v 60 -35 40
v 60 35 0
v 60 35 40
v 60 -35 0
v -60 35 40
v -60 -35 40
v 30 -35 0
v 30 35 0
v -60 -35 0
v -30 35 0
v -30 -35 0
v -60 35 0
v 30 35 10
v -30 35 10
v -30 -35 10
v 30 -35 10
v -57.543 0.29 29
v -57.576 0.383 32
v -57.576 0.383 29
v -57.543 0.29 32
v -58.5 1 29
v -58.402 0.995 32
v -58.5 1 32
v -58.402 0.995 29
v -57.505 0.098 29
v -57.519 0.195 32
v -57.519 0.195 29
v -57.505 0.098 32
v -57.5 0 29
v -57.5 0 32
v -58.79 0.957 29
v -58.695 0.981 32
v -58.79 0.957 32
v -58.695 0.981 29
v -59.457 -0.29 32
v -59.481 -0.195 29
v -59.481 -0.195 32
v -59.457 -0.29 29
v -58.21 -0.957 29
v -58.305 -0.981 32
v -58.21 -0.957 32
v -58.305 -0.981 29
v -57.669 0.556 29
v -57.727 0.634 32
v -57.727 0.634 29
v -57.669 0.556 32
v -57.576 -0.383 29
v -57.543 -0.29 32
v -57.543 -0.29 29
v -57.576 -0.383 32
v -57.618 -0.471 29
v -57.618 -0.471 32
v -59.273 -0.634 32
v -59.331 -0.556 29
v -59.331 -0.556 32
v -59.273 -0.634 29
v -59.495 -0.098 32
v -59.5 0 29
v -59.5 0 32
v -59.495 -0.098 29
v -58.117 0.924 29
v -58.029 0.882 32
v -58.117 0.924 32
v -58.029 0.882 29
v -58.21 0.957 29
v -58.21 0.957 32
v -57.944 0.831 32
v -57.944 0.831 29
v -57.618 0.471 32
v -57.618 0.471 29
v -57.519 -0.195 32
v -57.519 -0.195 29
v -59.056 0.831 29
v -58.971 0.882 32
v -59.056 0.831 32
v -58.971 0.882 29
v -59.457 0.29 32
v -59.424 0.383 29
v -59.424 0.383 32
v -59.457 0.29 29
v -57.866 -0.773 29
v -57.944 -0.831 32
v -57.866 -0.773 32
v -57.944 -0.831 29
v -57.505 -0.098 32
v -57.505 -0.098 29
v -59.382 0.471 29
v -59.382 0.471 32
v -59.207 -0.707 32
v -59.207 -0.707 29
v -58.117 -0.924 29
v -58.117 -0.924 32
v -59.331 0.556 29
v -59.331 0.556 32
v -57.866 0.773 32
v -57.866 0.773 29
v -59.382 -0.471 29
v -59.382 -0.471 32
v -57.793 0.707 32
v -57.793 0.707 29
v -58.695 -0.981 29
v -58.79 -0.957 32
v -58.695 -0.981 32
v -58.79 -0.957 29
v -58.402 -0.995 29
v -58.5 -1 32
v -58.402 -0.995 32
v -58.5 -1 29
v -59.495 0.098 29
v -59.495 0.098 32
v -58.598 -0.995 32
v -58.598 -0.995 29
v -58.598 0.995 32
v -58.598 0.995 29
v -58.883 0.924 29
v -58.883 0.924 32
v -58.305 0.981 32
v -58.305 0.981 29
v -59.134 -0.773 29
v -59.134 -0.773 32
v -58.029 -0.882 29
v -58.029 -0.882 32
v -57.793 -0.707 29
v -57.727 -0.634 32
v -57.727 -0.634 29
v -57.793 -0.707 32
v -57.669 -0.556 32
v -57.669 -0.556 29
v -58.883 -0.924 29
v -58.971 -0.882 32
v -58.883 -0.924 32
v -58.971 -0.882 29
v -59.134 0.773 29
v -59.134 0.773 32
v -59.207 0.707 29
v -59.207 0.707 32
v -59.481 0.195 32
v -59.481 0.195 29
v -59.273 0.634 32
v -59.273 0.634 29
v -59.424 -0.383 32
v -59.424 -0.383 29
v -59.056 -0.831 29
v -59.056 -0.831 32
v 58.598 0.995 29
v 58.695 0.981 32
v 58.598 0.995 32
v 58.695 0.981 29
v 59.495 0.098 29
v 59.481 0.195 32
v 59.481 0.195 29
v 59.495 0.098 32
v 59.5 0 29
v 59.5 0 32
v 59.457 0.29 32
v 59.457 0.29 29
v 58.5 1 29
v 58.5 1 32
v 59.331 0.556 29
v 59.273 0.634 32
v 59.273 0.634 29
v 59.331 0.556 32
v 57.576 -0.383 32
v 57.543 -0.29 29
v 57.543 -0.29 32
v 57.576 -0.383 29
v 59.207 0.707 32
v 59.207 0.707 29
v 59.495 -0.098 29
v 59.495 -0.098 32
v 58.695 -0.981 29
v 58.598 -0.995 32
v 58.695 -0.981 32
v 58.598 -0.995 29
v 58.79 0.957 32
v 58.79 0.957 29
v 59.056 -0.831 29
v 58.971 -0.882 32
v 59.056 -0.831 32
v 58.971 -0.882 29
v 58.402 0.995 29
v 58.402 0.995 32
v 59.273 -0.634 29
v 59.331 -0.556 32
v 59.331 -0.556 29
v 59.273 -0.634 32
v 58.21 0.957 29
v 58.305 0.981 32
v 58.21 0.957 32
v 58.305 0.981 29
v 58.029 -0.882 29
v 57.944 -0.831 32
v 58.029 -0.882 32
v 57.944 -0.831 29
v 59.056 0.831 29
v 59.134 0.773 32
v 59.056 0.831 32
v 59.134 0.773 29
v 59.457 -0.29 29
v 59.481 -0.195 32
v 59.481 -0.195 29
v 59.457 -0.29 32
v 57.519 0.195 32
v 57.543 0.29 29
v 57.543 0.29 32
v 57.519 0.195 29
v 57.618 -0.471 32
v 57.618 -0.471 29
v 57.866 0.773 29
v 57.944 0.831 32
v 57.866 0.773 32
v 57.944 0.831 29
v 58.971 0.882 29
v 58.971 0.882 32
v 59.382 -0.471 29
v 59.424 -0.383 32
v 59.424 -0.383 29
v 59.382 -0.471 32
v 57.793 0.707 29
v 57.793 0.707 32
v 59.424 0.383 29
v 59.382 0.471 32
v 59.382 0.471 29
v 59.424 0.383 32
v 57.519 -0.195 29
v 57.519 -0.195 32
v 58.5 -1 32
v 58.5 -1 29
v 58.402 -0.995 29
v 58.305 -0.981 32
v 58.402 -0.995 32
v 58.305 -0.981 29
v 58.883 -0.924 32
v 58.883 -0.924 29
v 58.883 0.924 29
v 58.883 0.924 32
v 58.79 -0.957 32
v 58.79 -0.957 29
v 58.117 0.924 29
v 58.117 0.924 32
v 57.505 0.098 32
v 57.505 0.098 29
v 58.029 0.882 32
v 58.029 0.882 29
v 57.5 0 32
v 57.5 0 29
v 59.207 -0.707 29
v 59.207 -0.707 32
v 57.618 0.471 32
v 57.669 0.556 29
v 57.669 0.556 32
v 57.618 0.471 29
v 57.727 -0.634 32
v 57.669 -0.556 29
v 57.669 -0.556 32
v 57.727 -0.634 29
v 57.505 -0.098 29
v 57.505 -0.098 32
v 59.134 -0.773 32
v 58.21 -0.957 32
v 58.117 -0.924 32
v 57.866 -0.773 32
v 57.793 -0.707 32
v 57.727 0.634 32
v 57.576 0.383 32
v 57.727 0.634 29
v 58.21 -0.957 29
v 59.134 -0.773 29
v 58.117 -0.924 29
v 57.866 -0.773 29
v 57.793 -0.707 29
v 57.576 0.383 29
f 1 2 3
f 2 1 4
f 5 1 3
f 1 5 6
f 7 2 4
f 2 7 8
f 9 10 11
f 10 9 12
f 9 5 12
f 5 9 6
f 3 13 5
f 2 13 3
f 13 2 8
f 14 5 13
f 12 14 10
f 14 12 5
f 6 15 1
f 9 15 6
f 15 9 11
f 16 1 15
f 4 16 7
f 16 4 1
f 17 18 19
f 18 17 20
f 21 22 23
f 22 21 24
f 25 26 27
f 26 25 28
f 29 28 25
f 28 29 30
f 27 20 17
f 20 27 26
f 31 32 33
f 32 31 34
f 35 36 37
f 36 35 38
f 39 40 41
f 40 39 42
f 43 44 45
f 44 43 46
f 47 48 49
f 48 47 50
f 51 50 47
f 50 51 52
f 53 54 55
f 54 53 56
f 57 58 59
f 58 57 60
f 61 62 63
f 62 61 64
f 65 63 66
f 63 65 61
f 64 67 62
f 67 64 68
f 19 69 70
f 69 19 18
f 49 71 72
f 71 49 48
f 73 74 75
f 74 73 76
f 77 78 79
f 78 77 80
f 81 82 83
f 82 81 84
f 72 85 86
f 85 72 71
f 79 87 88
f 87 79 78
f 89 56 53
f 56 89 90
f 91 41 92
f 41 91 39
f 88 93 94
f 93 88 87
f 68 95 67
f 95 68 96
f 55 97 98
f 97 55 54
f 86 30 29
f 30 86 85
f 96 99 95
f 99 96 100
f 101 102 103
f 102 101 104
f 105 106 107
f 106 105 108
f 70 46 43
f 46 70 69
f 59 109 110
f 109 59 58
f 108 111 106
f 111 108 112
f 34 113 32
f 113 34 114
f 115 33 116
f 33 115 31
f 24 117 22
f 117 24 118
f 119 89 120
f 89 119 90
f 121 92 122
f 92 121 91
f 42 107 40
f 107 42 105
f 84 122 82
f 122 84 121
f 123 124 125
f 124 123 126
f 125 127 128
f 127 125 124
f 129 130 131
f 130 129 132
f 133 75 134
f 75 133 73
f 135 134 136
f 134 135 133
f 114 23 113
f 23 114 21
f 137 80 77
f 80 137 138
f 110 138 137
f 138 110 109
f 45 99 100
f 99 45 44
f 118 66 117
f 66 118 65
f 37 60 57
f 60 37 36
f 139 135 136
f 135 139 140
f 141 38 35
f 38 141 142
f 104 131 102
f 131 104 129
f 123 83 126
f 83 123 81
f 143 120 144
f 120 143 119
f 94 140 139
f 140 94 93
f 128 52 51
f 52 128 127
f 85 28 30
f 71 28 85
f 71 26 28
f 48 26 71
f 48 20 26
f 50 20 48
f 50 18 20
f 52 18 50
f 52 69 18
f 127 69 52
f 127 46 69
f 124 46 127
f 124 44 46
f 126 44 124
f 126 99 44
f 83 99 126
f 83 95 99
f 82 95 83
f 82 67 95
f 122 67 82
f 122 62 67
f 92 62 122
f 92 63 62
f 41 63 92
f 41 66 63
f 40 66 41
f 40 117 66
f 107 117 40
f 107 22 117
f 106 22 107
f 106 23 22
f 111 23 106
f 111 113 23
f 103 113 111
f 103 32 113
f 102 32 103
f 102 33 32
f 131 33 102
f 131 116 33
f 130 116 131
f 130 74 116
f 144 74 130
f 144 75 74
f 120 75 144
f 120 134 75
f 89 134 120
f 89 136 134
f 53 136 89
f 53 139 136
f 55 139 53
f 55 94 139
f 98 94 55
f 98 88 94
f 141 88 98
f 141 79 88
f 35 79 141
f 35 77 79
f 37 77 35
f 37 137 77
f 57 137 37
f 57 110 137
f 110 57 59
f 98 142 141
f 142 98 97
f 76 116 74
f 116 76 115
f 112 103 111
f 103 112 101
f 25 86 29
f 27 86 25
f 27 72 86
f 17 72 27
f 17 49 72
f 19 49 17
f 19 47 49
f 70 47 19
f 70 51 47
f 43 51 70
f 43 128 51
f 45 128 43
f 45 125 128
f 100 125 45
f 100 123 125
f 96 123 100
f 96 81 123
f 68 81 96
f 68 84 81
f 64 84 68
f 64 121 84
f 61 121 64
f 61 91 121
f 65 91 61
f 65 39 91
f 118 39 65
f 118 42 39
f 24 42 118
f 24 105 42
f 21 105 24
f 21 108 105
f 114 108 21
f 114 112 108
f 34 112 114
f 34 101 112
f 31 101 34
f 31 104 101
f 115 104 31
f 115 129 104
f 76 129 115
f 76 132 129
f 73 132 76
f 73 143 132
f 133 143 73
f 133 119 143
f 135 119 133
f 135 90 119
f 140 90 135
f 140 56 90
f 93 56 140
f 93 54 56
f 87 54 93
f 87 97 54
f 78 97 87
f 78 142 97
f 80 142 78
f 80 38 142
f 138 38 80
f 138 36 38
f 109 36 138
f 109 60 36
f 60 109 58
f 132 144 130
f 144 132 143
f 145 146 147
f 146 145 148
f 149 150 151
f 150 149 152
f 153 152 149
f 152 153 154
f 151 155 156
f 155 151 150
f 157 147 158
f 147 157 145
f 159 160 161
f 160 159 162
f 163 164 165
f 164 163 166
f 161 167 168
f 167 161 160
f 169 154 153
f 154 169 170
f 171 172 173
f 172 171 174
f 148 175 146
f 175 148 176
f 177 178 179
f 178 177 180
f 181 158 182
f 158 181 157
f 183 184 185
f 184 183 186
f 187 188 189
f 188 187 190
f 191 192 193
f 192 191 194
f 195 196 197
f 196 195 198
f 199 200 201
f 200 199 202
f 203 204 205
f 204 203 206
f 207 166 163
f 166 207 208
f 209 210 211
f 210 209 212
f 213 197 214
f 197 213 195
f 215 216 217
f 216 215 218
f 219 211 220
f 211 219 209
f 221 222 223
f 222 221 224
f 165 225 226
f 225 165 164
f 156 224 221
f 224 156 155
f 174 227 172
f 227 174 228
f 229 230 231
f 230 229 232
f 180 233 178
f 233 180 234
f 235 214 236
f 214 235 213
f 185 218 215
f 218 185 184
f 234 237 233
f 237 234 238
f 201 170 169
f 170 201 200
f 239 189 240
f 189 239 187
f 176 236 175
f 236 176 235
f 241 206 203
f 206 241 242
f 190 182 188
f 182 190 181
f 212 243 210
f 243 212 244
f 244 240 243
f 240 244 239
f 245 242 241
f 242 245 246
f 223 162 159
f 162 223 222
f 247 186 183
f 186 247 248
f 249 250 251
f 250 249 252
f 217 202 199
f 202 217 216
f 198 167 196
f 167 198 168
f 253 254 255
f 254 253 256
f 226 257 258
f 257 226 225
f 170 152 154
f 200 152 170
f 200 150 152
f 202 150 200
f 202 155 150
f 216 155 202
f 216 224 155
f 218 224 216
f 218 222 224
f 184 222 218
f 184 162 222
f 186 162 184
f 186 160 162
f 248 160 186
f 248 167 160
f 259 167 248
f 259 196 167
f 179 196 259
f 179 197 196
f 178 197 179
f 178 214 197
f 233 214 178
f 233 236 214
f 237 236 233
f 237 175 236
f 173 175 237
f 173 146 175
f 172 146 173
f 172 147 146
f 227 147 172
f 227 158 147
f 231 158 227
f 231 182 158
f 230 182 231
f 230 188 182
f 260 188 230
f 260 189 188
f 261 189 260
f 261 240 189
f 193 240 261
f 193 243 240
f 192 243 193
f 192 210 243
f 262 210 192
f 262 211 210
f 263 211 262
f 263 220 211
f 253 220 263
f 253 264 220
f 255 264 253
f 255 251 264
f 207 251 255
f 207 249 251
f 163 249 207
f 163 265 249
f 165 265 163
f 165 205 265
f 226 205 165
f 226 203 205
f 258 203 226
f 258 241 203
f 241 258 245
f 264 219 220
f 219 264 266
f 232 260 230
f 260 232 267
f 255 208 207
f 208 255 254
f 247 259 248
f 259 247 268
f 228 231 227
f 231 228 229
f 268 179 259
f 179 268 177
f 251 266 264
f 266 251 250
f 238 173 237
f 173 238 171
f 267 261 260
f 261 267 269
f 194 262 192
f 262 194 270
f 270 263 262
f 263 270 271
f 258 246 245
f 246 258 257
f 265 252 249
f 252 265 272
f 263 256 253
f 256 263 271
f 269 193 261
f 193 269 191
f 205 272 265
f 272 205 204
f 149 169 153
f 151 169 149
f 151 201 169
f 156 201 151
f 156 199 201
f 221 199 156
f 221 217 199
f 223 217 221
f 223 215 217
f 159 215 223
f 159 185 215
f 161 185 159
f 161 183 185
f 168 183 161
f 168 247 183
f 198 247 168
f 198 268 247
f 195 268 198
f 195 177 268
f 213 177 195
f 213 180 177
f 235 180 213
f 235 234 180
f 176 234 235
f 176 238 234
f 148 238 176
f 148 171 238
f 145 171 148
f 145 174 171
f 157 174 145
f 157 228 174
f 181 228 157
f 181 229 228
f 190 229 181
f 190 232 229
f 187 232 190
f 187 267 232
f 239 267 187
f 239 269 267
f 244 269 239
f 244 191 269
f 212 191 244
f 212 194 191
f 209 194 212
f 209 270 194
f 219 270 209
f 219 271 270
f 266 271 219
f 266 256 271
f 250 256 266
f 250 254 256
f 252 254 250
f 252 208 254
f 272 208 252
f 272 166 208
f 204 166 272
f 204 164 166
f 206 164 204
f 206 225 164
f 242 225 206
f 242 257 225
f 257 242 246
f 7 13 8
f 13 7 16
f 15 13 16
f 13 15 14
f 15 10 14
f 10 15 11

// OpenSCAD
// Mini Horizontal Gel Electrophoresis Buffer Tank
// Outer dimensions: 120 x 70 x 40 mm
// Wall thickness: 3 mm
// Floor thickness: 3 mm
// Inner platform: 60 mm long, full width, 10 mm high from inner floor

$fn = 64;

// Outer dimensions
X_OUT = 120;
Y_OUT = 70;
Z_OUT = 40;

// Thicknesses
wall_t = 3;
floor_t = 3;

// Inner dimensions
X_IN  = X_OUT - 2 * wall_t;
Y_IN  = Y_OUT - 2 * wall_t;
Z_IN  = Z_OUT - floor_t;

// Platform dimensions
plat_len = 60;
plat_w   = Y_IN;
plat_h   = 10; // Height from inner floor

// Electrode hole
hole_d   = 2;
hole_y   = 0;
hole_z   = 30;

// Build the main tank body (hollow box)
// We construct the outer shell and subtract the inner void.
// The inner void is split by the platform.

difference() {
    // 1. Outer Shell
    // Create a solid block and subtract the inner cavity.
    // The inner cavity is defined by the union of the two buffer chambers and the space above the platform.
    
    union() {
        // Outer block (Centered on origin)
        translate([-X_OUT / 2, -Y_OUT / 2, 0]) 
            cube([X_OUT, Y_OUT, Z_OUT]);
        
        // Inner void (to be subtracted)
        // The void consists of the two side chambers and the space above the platform.
        // Chamber 1 (Left): x from 0 to (X_IN - plat_len)/2 relative to inner center
        // Chamber 2 (Right): x from (X_IN + plat_len)/2 to X_IN relative to inner center
        // Space Above: x from 0 to X_IN, z from plat_h to Z_IN
        
        void_h = X_IN - plat_len; // Total width of chambers
        half_void = void_h / 2;   // Width of one chamber
        
        // Chamber 1
        translate([-X_OUT / 2 + half_void, -Y_OUT / 2, 0]) 
            cube([half_void, Y_OUT, Z_IN]);
            
        // Chamber 2
        translate([-X_OUT / 2 + X_IN - half_void, -Y_OUT / 2, 0]) 
            cube([half_void, Y_OUT, Z_IN]);
            
        // Space above platform
        translate([-X_OUT / 2, -Y_OUT / 2, plat_h]) 
            cube([X_IN, Y_OUT, Z_IN - plat_h]);
            
    }
    
    // 2. Platform (Solid block inside the void)
    // Positioned at the bottom of the void, centered in X.
    // Bottom of platform is at z = floor_t = 3 (relative to outer bottom).
    // Top of platform is at z = 3 + 10 = 13.
    // It spans full inner width Y_IN.
    // It is centered in X.
    
    translate([
        -X_OUT / 2 + (X_OUT - plat_len) / 2, 
        -Y_OUT / 2, 
        0 
    ]) 
        cube([plat_len, Y_OUT, plat_h]);
        
    // 3. Electrode Holes
    // Horizontal holes along X axis.
    // Centered at y = 0, z = 30.
    // Diameter = 2 mm.
    // Length = wall_t (only through the end wall).
    // There are two holes, one at each end wall (X = -X_OUT/2 and X = +X_OUT/2).
    
    for (side = [-1, 1]) {
        translate([
            side * (X_OUT / 2 - wall_t / 2), 
            side * hole_y, 
            hole_z - hole_d / 2
        ]) 
            cylinder(h = wall_t, d = hole_d);
    }
}
